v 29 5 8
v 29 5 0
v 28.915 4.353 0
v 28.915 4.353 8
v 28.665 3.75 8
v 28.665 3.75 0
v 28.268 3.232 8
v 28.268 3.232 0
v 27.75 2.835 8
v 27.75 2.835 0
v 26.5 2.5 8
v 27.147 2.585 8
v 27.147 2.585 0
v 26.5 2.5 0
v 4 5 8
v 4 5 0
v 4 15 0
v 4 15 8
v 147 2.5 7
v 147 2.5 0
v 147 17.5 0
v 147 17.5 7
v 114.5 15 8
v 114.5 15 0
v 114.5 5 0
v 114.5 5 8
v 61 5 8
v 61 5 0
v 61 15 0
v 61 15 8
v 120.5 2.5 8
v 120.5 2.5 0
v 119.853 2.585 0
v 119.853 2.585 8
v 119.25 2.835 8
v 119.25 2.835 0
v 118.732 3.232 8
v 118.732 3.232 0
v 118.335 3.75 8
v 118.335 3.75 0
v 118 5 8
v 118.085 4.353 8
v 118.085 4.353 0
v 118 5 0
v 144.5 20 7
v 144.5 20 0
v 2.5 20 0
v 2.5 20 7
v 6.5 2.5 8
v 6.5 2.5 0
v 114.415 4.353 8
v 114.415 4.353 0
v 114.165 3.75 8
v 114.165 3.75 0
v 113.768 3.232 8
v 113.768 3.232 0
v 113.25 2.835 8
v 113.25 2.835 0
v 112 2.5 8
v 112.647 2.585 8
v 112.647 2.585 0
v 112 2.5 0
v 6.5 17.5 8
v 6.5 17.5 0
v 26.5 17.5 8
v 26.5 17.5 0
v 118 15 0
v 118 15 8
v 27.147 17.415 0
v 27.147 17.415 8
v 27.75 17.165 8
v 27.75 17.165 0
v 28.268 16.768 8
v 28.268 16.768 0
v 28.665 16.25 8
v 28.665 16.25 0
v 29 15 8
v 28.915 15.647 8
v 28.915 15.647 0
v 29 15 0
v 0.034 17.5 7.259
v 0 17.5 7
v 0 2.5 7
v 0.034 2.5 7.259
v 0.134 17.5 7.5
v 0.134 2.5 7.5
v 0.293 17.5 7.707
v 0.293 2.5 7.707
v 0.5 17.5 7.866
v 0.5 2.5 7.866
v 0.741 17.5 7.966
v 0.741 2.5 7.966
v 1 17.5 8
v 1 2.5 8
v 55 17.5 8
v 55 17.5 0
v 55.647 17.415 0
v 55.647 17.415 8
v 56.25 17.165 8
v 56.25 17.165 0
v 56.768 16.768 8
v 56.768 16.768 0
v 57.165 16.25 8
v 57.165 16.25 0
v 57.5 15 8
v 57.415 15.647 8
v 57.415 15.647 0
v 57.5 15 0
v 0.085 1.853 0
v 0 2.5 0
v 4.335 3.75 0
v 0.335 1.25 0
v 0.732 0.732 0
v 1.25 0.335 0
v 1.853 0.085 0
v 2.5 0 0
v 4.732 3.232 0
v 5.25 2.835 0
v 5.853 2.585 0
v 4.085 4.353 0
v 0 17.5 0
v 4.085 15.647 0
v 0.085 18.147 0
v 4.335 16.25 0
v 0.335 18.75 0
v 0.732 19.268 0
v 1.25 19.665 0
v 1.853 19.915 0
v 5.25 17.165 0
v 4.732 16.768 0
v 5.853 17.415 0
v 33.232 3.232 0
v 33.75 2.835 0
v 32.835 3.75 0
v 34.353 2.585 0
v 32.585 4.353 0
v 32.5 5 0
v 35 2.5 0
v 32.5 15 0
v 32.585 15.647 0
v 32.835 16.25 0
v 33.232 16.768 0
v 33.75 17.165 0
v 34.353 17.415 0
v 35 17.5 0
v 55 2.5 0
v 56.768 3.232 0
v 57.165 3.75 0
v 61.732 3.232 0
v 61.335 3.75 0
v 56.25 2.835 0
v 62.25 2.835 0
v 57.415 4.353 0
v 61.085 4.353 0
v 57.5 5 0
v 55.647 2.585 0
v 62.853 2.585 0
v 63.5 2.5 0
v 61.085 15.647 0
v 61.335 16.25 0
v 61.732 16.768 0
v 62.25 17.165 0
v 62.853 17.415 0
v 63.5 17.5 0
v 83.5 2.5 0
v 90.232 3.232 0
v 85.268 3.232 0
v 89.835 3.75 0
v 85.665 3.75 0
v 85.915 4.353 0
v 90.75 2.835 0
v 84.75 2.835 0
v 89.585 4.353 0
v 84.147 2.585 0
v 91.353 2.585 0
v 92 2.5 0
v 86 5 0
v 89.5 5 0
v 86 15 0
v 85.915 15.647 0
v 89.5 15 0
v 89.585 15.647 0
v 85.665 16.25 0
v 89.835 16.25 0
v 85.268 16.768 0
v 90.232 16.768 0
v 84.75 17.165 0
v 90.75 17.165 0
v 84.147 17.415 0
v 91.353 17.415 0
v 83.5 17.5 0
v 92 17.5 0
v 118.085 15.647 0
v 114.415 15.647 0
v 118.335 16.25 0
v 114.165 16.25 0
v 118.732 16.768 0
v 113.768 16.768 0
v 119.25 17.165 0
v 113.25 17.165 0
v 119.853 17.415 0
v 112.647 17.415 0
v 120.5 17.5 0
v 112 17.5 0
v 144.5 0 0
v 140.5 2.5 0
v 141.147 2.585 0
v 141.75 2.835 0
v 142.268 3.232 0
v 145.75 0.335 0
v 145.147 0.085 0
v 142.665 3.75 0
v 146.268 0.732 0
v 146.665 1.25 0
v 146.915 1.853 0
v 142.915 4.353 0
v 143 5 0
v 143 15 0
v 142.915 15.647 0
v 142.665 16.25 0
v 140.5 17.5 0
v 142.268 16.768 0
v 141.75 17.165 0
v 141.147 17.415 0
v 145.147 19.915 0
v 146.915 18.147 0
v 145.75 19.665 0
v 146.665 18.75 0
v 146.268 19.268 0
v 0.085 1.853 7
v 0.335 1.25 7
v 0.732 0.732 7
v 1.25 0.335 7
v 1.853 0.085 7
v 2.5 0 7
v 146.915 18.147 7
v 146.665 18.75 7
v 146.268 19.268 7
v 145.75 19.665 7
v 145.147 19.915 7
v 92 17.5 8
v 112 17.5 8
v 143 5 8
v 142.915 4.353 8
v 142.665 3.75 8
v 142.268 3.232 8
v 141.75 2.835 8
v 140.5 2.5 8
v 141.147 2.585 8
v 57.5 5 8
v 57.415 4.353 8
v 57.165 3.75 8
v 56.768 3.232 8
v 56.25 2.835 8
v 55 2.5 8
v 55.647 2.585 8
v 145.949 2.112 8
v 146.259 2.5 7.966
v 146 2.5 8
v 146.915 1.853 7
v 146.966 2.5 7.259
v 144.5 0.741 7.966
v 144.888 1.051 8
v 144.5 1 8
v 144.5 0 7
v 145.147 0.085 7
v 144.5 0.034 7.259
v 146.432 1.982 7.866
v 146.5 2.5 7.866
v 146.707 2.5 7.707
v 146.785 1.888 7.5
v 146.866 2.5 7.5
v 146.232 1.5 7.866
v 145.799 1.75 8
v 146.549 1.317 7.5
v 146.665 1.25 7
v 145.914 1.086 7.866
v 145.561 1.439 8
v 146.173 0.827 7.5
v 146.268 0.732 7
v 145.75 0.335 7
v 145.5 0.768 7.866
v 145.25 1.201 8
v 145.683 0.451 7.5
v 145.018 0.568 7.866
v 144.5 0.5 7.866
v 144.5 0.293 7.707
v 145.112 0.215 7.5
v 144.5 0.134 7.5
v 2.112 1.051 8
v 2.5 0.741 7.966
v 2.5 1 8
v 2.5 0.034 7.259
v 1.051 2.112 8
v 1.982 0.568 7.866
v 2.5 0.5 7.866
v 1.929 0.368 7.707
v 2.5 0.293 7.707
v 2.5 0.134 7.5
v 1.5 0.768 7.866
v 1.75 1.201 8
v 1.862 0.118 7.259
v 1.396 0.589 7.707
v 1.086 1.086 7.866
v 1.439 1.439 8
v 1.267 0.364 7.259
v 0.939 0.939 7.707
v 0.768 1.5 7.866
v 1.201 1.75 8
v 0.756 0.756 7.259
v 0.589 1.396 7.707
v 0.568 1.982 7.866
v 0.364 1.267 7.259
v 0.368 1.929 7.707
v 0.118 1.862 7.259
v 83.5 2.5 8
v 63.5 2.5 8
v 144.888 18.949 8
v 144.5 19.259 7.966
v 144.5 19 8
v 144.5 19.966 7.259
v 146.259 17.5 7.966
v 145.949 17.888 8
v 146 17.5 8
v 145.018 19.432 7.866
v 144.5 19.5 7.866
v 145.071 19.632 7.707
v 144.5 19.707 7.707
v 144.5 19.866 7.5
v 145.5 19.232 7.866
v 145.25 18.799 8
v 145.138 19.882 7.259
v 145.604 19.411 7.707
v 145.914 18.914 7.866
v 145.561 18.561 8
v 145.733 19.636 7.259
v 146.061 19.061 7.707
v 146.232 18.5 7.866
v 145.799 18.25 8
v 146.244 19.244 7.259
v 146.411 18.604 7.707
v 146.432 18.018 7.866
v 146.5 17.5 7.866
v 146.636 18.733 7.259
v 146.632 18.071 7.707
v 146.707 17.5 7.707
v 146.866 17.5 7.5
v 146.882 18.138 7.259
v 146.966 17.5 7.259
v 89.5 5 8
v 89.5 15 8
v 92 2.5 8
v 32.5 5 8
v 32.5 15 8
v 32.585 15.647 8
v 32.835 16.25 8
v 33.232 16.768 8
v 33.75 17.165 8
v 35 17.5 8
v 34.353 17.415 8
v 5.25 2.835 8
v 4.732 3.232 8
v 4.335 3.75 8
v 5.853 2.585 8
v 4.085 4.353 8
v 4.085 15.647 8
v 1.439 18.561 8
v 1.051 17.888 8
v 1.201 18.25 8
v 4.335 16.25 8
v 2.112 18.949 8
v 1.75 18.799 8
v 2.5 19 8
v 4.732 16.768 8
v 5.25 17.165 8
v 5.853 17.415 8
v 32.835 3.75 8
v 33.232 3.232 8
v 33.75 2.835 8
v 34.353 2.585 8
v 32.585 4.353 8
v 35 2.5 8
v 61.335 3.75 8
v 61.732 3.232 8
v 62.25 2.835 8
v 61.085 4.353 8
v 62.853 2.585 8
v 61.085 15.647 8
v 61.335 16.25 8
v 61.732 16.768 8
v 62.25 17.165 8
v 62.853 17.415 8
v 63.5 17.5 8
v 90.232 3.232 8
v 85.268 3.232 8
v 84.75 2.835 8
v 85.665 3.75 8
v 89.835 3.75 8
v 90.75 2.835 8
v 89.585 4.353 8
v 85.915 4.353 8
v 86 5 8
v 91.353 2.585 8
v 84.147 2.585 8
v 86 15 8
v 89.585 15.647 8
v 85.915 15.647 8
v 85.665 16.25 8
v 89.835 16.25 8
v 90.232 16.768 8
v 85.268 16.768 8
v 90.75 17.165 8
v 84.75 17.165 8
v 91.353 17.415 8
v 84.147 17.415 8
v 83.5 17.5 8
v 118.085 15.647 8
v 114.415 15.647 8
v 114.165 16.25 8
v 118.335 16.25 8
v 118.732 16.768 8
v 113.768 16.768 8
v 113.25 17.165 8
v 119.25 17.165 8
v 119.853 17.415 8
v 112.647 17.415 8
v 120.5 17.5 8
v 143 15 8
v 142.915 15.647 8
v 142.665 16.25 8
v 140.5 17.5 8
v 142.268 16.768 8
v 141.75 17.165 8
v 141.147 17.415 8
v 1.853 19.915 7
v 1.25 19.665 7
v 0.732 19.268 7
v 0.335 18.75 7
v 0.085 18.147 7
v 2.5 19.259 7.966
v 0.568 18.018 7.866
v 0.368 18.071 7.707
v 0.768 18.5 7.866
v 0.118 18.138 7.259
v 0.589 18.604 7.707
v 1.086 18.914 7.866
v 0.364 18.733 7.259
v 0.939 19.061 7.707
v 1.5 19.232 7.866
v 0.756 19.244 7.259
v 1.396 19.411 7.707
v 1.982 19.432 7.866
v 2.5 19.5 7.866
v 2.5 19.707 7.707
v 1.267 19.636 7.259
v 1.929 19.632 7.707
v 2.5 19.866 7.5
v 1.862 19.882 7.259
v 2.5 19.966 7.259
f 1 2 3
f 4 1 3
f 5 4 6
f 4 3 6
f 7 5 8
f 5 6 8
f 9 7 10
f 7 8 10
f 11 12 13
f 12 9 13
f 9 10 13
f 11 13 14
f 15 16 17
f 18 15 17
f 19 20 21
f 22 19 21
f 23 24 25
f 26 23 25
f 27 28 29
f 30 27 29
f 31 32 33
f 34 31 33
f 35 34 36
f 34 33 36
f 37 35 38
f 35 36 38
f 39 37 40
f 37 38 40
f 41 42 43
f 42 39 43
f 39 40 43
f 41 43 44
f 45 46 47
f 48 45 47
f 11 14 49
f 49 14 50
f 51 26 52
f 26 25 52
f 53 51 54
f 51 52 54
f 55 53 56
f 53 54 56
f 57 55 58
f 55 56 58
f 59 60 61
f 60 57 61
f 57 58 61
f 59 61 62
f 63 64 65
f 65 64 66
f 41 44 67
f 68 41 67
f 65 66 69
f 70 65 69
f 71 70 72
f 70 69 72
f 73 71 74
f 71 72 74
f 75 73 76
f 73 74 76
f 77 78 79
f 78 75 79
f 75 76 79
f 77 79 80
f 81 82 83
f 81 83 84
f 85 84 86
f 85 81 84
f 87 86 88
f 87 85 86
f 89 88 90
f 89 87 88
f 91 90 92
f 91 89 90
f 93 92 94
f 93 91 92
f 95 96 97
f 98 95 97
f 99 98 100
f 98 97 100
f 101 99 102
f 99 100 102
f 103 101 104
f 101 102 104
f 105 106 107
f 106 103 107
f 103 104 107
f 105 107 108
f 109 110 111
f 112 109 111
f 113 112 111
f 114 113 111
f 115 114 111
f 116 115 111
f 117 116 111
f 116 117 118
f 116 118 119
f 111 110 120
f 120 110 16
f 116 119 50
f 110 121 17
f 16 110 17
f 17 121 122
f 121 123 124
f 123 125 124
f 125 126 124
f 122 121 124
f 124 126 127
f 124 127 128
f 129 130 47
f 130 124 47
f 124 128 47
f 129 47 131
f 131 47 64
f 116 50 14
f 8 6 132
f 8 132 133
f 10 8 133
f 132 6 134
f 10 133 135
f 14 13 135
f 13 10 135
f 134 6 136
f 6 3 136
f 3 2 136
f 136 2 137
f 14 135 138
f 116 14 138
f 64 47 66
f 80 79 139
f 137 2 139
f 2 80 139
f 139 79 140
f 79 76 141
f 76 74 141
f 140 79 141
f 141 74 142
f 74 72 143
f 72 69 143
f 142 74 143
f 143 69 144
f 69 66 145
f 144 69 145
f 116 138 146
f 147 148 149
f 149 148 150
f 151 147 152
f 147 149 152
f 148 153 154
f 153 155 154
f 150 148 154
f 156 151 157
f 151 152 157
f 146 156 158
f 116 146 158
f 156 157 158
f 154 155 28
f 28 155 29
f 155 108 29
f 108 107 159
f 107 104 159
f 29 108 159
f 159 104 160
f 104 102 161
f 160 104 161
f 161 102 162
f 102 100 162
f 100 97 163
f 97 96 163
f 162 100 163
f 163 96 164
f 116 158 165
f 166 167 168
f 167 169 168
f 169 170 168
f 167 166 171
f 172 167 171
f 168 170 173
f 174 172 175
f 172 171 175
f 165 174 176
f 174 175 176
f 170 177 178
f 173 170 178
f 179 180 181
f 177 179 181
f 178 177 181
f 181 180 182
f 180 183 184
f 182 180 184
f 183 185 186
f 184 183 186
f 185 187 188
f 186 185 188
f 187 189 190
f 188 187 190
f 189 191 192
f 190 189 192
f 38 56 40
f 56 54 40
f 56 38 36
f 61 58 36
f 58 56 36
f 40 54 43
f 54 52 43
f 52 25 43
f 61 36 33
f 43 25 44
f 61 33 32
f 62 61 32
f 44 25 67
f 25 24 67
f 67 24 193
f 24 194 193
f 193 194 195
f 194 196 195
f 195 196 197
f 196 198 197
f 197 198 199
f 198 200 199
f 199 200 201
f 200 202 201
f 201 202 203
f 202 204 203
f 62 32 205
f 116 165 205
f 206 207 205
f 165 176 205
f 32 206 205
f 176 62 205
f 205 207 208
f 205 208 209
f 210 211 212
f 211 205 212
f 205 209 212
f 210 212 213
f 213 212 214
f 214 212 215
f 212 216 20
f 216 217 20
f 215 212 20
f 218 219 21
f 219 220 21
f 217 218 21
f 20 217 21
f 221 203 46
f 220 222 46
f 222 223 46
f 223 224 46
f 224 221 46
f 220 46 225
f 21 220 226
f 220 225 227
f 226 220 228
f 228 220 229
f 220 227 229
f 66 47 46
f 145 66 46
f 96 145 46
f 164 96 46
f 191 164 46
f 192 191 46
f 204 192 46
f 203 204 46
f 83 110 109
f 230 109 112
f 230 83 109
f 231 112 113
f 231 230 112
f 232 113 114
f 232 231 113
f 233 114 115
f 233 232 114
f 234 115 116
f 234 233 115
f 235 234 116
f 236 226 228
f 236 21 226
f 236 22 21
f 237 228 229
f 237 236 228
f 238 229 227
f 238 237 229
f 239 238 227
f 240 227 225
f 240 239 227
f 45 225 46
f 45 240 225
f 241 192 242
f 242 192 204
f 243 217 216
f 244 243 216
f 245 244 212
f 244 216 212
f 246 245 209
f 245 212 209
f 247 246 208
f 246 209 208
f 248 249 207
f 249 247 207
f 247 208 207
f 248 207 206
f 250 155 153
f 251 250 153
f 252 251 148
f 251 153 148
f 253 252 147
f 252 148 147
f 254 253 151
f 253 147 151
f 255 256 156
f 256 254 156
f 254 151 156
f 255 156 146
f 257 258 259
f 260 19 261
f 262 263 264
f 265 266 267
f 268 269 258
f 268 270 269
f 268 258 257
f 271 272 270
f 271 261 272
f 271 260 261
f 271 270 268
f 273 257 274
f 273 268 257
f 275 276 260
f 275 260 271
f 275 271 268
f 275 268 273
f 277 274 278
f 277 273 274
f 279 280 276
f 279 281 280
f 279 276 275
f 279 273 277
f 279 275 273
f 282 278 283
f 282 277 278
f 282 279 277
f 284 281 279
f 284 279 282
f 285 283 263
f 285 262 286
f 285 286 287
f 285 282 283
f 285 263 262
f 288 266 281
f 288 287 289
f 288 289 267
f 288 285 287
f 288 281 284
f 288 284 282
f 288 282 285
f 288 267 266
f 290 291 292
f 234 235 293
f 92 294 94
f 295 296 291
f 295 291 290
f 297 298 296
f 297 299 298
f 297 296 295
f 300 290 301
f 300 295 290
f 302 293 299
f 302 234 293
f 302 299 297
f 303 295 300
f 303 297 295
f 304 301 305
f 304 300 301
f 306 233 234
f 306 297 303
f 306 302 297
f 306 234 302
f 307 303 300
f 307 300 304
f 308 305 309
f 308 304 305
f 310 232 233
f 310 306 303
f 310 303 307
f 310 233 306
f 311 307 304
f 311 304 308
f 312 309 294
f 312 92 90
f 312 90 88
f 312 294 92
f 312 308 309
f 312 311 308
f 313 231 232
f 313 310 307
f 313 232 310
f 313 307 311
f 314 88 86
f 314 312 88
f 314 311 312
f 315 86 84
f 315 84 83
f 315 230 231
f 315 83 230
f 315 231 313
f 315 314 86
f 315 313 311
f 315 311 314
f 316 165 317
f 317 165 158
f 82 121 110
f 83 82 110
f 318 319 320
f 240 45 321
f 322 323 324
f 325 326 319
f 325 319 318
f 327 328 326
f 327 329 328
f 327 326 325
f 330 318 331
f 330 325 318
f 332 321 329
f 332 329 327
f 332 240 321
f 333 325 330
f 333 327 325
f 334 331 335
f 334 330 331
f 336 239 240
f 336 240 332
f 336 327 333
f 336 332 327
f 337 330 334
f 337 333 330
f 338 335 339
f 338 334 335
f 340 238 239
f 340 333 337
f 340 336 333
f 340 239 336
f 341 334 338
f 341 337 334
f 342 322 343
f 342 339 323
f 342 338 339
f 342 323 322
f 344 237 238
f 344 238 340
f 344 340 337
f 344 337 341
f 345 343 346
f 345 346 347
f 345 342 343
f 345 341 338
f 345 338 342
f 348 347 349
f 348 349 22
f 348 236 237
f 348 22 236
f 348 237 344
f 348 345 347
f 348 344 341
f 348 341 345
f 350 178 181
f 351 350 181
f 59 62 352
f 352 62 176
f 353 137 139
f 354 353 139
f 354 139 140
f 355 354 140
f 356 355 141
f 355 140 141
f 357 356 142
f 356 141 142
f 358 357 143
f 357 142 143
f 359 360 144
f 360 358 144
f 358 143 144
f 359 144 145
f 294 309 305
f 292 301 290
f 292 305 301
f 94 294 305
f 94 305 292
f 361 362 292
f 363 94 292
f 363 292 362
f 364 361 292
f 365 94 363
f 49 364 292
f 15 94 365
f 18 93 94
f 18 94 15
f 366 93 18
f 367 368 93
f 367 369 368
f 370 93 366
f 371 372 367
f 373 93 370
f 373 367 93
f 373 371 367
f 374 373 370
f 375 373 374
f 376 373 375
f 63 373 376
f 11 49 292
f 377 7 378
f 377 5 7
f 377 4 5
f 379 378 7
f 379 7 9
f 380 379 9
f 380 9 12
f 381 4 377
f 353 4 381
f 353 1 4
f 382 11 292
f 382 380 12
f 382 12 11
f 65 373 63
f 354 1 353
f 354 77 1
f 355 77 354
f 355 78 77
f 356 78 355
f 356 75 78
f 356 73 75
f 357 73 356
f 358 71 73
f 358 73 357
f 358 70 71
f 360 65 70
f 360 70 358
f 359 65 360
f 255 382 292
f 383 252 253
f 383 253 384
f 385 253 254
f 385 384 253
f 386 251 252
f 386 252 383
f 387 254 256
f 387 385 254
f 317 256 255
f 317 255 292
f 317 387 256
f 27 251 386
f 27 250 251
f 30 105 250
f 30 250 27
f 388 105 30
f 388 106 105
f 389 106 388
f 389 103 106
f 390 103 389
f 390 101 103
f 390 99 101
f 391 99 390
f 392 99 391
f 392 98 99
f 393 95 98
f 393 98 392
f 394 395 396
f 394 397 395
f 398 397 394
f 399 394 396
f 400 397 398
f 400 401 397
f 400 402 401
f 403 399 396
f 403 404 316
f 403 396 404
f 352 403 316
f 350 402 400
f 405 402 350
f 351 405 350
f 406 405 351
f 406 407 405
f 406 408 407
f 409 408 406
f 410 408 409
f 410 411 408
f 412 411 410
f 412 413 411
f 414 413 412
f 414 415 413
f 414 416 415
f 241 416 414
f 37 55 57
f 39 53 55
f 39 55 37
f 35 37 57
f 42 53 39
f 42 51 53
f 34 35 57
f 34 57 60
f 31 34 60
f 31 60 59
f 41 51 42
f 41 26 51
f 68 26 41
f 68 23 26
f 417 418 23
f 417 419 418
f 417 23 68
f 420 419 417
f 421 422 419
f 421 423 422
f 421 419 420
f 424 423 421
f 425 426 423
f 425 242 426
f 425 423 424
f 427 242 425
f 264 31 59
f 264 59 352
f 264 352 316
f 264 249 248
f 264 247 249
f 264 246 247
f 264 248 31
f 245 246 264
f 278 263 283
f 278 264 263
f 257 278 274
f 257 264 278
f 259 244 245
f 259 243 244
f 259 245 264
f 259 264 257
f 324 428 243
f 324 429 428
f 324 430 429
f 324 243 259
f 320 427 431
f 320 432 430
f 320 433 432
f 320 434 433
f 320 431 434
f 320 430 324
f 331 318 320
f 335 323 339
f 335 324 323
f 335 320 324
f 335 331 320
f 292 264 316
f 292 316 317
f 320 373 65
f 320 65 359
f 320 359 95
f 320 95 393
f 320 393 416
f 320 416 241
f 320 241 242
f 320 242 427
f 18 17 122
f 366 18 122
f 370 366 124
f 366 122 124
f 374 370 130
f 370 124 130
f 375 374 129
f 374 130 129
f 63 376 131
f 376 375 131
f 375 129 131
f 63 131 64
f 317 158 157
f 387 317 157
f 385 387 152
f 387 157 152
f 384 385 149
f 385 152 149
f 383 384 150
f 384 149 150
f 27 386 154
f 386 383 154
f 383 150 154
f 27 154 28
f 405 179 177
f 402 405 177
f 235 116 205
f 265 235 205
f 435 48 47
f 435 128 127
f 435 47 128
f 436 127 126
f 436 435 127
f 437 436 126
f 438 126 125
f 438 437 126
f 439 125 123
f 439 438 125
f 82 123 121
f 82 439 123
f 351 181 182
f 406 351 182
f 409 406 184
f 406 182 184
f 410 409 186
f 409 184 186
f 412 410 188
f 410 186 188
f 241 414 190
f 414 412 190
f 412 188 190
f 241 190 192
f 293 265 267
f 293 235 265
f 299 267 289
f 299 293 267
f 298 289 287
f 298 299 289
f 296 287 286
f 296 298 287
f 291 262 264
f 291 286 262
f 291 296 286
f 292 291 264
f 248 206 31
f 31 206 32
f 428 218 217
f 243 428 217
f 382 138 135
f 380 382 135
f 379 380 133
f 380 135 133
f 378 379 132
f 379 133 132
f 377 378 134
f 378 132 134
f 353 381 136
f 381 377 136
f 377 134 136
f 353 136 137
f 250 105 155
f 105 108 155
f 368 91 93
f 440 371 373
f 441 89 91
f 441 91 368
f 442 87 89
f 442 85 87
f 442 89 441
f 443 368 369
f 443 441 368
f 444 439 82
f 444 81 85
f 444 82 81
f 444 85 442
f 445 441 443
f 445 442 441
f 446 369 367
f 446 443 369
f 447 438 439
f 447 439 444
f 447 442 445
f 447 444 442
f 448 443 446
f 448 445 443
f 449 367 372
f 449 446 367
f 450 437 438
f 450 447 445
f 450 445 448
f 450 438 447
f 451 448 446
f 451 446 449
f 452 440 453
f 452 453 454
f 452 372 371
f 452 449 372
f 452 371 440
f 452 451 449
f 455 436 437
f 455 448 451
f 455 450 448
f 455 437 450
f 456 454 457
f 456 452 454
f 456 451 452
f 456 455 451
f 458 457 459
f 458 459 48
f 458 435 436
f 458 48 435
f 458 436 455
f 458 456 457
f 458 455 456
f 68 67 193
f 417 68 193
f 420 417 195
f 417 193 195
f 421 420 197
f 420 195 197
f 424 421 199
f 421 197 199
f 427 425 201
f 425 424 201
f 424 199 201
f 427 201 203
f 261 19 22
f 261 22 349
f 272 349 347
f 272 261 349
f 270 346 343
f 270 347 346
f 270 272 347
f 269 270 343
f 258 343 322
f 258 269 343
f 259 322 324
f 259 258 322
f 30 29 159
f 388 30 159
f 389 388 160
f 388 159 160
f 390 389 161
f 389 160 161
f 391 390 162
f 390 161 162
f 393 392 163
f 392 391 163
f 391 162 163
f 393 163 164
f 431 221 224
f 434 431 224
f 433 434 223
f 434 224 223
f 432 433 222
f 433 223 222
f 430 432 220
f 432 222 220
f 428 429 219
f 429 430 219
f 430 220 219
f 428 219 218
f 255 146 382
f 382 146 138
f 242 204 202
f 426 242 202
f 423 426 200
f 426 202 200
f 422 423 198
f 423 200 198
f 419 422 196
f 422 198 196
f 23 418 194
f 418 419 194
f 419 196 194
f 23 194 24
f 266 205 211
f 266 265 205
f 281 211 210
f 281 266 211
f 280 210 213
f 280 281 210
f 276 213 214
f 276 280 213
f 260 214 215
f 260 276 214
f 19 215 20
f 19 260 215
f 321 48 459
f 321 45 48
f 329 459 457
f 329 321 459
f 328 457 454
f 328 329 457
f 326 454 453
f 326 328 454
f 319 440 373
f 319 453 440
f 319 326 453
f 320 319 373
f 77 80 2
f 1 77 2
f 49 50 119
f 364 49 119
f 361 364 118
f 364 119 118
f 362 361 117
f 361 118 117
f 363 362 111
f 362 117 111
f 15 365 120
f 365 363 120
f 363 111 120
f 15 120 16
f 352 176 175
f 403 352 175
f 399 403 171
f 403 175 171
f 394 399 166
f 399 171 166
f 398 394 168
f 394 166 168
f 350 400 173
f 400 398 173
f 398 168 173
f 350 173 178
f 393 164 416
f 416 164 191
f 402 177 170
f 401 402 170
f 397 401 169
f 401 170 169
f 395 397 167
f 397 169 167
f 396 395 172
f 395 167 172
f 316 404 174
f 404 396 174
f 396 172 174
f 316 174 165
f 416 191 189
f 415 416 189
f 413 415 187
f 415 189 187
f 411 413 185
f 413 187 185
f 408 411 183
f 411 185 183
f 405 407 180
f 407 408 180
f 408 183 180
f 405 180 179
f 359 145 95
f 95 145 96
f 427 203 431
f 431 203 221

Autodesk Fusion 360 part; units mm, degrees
sketch "Sketch1" plane through (0, 0, 0) normal (0, 0, 1) x (1, 0, 0)
  line L0 (0, 0) -> (147, 0)
  line L1 (147, 0) -> (147, 20)
  line L2 (147, 20) -> (0, 20)
  line L3 (0, 20) -> (0, 0)
  line L4 (6.5, 17.5) -> (26.5, 17.5)
  line L5 (29, 15) -> (29, 5)
  line L6 (26.5, 2.5) -> (6.5, 2.5)
  line L7 (4, 5) -> (4, 15)
  line L8 (147, 10) -> (0, 10) construction
  line L9 (4, 10) -> (29, 10) construction
  line L10 (35, 17.5) -> (55, 17.5)
  line L11 (32.5, 5) -> (32.5, 15)
  line L12 (57.5, 15) -> (57.5, 5)
  line L13 (55, 2.5) -> (35, 2.5)
  line L14 (63.5, 17.5) -> (83.5, 17.5)
  line L15 (61, 5) -> (61, 15)
  line L16 (86, 15) -> (86, 5)
  line L17 (83.5, 2.5) -> (63.5, 2.5)
  line L18 (92, 17.5) -> (112, 17.5)
  line L19 (89.5, 5) -> (89.5, 15)
  line L20 (114.5, 15) -> (114.5, 5)
  line L21 (112, 2.5) -> (92, 2.5)
  line L22 (120.5, 17.5) -> (140.5, 17.5)
  line L23 (118, 5) -> (118, 15)
  line L24 (143, 15) -> (143, 5)
  line L25 (140.5, 2.5) -> (120.5, 2.5)
  arc A0 (6.5, 17.5) -> (4, 15) centre (6.5, 15) ccw
  arc A1 (4, 5) -> (6.5, 2.5) centre (6.5, 5) ccw
  arc A2 (26.5, 2.5) -> (29, 5) centre (26.5, 5) ccw
  arc A3 (29, 15) -> (26.5, 17.5) centre (26.5, 15) ccw
  arc A4 (35, 17.5) -> (32.5, 15) centre (35, 15) ccw
  arc A5 (32.5, 5) -> (35, 2.5) centre (35, 5) ccw
  arc A6 (55, 2.5) -> (57.5, 5) centre (55, 5) ccw
  arc A7 (57.5, 15) -> (55, 17.5) centre (55, 15) ccw
  arc A8 (63.5, 17.5) -> (61, 15) centre (63.5, 15) ccw
  arc A9 (61, 5) -> (63.5, 2.5) centre (63.5, 5) ccw
  arc A10 (83.5, 2.5) -> (86, 5) centre (83.5, 5) ccw
  arc A11 (86, 15) -> (83.5, 17.5) centre (83.5, 15) ccw
  arc A12 (92, 17.5) -> (89.5, 15) centre (92, 15) ccw
  arc A13 (89.5, 5) -> (92, 2.5) centre (92, 5) ccw
  arc A14 (112, 2.5) -> (114.5, 5) centre (112, 5) ccw
  arc A15 (114.5, 15) -> (112, 17.5) centre (112, 15) ccw
  arc A16 (120.5, 17.5) -> (118, 15) centre (120.5, 15) ccw
  arc A17 (118, 5) -> (120.5, 2.5) centre (120.5, 5) ccw
  arc A18 (140.5, 2.5) -> (143, 5) centre (140.5, 5) ccw
  arc A19 (143, 15) -> (140.5, 17.5) centre (140.5, 15) ccw
  point P0 (4, 17.5)
  point P1 (29, 17.5)
  point P2 (4, 2.5)
  dimension "d1" = 147
  dimension "d2" = 20
  dimension "d5" = 25
  dimension "d6" = 15
  dimension "d11" = 4
  dimension "d12" = 2.5
  dimension "d13" = 2.5
extrude "Extrude1" add sketch "Sketch1" along normal blind 8
fillet "Fillet1" radius 2.5 4 edges at (0, 0, 4) (0, 20, 4) (147, 0, 4) (147, 20, 4)
fillet "Fillet2" radius 1 8 edges at (146.2678, 0.7322, 8) (147, 10, 8) (146.2678, 19.2678, 8) (73.5, 20, 8) (0.7322, 19.2678, 8) (0, 10, 8) (0.7322, 0.7322, 8) (73.5, 0, 8)
equation "d1 = ( ( 42 * 7 ) / 2 ) * 1 mm"
